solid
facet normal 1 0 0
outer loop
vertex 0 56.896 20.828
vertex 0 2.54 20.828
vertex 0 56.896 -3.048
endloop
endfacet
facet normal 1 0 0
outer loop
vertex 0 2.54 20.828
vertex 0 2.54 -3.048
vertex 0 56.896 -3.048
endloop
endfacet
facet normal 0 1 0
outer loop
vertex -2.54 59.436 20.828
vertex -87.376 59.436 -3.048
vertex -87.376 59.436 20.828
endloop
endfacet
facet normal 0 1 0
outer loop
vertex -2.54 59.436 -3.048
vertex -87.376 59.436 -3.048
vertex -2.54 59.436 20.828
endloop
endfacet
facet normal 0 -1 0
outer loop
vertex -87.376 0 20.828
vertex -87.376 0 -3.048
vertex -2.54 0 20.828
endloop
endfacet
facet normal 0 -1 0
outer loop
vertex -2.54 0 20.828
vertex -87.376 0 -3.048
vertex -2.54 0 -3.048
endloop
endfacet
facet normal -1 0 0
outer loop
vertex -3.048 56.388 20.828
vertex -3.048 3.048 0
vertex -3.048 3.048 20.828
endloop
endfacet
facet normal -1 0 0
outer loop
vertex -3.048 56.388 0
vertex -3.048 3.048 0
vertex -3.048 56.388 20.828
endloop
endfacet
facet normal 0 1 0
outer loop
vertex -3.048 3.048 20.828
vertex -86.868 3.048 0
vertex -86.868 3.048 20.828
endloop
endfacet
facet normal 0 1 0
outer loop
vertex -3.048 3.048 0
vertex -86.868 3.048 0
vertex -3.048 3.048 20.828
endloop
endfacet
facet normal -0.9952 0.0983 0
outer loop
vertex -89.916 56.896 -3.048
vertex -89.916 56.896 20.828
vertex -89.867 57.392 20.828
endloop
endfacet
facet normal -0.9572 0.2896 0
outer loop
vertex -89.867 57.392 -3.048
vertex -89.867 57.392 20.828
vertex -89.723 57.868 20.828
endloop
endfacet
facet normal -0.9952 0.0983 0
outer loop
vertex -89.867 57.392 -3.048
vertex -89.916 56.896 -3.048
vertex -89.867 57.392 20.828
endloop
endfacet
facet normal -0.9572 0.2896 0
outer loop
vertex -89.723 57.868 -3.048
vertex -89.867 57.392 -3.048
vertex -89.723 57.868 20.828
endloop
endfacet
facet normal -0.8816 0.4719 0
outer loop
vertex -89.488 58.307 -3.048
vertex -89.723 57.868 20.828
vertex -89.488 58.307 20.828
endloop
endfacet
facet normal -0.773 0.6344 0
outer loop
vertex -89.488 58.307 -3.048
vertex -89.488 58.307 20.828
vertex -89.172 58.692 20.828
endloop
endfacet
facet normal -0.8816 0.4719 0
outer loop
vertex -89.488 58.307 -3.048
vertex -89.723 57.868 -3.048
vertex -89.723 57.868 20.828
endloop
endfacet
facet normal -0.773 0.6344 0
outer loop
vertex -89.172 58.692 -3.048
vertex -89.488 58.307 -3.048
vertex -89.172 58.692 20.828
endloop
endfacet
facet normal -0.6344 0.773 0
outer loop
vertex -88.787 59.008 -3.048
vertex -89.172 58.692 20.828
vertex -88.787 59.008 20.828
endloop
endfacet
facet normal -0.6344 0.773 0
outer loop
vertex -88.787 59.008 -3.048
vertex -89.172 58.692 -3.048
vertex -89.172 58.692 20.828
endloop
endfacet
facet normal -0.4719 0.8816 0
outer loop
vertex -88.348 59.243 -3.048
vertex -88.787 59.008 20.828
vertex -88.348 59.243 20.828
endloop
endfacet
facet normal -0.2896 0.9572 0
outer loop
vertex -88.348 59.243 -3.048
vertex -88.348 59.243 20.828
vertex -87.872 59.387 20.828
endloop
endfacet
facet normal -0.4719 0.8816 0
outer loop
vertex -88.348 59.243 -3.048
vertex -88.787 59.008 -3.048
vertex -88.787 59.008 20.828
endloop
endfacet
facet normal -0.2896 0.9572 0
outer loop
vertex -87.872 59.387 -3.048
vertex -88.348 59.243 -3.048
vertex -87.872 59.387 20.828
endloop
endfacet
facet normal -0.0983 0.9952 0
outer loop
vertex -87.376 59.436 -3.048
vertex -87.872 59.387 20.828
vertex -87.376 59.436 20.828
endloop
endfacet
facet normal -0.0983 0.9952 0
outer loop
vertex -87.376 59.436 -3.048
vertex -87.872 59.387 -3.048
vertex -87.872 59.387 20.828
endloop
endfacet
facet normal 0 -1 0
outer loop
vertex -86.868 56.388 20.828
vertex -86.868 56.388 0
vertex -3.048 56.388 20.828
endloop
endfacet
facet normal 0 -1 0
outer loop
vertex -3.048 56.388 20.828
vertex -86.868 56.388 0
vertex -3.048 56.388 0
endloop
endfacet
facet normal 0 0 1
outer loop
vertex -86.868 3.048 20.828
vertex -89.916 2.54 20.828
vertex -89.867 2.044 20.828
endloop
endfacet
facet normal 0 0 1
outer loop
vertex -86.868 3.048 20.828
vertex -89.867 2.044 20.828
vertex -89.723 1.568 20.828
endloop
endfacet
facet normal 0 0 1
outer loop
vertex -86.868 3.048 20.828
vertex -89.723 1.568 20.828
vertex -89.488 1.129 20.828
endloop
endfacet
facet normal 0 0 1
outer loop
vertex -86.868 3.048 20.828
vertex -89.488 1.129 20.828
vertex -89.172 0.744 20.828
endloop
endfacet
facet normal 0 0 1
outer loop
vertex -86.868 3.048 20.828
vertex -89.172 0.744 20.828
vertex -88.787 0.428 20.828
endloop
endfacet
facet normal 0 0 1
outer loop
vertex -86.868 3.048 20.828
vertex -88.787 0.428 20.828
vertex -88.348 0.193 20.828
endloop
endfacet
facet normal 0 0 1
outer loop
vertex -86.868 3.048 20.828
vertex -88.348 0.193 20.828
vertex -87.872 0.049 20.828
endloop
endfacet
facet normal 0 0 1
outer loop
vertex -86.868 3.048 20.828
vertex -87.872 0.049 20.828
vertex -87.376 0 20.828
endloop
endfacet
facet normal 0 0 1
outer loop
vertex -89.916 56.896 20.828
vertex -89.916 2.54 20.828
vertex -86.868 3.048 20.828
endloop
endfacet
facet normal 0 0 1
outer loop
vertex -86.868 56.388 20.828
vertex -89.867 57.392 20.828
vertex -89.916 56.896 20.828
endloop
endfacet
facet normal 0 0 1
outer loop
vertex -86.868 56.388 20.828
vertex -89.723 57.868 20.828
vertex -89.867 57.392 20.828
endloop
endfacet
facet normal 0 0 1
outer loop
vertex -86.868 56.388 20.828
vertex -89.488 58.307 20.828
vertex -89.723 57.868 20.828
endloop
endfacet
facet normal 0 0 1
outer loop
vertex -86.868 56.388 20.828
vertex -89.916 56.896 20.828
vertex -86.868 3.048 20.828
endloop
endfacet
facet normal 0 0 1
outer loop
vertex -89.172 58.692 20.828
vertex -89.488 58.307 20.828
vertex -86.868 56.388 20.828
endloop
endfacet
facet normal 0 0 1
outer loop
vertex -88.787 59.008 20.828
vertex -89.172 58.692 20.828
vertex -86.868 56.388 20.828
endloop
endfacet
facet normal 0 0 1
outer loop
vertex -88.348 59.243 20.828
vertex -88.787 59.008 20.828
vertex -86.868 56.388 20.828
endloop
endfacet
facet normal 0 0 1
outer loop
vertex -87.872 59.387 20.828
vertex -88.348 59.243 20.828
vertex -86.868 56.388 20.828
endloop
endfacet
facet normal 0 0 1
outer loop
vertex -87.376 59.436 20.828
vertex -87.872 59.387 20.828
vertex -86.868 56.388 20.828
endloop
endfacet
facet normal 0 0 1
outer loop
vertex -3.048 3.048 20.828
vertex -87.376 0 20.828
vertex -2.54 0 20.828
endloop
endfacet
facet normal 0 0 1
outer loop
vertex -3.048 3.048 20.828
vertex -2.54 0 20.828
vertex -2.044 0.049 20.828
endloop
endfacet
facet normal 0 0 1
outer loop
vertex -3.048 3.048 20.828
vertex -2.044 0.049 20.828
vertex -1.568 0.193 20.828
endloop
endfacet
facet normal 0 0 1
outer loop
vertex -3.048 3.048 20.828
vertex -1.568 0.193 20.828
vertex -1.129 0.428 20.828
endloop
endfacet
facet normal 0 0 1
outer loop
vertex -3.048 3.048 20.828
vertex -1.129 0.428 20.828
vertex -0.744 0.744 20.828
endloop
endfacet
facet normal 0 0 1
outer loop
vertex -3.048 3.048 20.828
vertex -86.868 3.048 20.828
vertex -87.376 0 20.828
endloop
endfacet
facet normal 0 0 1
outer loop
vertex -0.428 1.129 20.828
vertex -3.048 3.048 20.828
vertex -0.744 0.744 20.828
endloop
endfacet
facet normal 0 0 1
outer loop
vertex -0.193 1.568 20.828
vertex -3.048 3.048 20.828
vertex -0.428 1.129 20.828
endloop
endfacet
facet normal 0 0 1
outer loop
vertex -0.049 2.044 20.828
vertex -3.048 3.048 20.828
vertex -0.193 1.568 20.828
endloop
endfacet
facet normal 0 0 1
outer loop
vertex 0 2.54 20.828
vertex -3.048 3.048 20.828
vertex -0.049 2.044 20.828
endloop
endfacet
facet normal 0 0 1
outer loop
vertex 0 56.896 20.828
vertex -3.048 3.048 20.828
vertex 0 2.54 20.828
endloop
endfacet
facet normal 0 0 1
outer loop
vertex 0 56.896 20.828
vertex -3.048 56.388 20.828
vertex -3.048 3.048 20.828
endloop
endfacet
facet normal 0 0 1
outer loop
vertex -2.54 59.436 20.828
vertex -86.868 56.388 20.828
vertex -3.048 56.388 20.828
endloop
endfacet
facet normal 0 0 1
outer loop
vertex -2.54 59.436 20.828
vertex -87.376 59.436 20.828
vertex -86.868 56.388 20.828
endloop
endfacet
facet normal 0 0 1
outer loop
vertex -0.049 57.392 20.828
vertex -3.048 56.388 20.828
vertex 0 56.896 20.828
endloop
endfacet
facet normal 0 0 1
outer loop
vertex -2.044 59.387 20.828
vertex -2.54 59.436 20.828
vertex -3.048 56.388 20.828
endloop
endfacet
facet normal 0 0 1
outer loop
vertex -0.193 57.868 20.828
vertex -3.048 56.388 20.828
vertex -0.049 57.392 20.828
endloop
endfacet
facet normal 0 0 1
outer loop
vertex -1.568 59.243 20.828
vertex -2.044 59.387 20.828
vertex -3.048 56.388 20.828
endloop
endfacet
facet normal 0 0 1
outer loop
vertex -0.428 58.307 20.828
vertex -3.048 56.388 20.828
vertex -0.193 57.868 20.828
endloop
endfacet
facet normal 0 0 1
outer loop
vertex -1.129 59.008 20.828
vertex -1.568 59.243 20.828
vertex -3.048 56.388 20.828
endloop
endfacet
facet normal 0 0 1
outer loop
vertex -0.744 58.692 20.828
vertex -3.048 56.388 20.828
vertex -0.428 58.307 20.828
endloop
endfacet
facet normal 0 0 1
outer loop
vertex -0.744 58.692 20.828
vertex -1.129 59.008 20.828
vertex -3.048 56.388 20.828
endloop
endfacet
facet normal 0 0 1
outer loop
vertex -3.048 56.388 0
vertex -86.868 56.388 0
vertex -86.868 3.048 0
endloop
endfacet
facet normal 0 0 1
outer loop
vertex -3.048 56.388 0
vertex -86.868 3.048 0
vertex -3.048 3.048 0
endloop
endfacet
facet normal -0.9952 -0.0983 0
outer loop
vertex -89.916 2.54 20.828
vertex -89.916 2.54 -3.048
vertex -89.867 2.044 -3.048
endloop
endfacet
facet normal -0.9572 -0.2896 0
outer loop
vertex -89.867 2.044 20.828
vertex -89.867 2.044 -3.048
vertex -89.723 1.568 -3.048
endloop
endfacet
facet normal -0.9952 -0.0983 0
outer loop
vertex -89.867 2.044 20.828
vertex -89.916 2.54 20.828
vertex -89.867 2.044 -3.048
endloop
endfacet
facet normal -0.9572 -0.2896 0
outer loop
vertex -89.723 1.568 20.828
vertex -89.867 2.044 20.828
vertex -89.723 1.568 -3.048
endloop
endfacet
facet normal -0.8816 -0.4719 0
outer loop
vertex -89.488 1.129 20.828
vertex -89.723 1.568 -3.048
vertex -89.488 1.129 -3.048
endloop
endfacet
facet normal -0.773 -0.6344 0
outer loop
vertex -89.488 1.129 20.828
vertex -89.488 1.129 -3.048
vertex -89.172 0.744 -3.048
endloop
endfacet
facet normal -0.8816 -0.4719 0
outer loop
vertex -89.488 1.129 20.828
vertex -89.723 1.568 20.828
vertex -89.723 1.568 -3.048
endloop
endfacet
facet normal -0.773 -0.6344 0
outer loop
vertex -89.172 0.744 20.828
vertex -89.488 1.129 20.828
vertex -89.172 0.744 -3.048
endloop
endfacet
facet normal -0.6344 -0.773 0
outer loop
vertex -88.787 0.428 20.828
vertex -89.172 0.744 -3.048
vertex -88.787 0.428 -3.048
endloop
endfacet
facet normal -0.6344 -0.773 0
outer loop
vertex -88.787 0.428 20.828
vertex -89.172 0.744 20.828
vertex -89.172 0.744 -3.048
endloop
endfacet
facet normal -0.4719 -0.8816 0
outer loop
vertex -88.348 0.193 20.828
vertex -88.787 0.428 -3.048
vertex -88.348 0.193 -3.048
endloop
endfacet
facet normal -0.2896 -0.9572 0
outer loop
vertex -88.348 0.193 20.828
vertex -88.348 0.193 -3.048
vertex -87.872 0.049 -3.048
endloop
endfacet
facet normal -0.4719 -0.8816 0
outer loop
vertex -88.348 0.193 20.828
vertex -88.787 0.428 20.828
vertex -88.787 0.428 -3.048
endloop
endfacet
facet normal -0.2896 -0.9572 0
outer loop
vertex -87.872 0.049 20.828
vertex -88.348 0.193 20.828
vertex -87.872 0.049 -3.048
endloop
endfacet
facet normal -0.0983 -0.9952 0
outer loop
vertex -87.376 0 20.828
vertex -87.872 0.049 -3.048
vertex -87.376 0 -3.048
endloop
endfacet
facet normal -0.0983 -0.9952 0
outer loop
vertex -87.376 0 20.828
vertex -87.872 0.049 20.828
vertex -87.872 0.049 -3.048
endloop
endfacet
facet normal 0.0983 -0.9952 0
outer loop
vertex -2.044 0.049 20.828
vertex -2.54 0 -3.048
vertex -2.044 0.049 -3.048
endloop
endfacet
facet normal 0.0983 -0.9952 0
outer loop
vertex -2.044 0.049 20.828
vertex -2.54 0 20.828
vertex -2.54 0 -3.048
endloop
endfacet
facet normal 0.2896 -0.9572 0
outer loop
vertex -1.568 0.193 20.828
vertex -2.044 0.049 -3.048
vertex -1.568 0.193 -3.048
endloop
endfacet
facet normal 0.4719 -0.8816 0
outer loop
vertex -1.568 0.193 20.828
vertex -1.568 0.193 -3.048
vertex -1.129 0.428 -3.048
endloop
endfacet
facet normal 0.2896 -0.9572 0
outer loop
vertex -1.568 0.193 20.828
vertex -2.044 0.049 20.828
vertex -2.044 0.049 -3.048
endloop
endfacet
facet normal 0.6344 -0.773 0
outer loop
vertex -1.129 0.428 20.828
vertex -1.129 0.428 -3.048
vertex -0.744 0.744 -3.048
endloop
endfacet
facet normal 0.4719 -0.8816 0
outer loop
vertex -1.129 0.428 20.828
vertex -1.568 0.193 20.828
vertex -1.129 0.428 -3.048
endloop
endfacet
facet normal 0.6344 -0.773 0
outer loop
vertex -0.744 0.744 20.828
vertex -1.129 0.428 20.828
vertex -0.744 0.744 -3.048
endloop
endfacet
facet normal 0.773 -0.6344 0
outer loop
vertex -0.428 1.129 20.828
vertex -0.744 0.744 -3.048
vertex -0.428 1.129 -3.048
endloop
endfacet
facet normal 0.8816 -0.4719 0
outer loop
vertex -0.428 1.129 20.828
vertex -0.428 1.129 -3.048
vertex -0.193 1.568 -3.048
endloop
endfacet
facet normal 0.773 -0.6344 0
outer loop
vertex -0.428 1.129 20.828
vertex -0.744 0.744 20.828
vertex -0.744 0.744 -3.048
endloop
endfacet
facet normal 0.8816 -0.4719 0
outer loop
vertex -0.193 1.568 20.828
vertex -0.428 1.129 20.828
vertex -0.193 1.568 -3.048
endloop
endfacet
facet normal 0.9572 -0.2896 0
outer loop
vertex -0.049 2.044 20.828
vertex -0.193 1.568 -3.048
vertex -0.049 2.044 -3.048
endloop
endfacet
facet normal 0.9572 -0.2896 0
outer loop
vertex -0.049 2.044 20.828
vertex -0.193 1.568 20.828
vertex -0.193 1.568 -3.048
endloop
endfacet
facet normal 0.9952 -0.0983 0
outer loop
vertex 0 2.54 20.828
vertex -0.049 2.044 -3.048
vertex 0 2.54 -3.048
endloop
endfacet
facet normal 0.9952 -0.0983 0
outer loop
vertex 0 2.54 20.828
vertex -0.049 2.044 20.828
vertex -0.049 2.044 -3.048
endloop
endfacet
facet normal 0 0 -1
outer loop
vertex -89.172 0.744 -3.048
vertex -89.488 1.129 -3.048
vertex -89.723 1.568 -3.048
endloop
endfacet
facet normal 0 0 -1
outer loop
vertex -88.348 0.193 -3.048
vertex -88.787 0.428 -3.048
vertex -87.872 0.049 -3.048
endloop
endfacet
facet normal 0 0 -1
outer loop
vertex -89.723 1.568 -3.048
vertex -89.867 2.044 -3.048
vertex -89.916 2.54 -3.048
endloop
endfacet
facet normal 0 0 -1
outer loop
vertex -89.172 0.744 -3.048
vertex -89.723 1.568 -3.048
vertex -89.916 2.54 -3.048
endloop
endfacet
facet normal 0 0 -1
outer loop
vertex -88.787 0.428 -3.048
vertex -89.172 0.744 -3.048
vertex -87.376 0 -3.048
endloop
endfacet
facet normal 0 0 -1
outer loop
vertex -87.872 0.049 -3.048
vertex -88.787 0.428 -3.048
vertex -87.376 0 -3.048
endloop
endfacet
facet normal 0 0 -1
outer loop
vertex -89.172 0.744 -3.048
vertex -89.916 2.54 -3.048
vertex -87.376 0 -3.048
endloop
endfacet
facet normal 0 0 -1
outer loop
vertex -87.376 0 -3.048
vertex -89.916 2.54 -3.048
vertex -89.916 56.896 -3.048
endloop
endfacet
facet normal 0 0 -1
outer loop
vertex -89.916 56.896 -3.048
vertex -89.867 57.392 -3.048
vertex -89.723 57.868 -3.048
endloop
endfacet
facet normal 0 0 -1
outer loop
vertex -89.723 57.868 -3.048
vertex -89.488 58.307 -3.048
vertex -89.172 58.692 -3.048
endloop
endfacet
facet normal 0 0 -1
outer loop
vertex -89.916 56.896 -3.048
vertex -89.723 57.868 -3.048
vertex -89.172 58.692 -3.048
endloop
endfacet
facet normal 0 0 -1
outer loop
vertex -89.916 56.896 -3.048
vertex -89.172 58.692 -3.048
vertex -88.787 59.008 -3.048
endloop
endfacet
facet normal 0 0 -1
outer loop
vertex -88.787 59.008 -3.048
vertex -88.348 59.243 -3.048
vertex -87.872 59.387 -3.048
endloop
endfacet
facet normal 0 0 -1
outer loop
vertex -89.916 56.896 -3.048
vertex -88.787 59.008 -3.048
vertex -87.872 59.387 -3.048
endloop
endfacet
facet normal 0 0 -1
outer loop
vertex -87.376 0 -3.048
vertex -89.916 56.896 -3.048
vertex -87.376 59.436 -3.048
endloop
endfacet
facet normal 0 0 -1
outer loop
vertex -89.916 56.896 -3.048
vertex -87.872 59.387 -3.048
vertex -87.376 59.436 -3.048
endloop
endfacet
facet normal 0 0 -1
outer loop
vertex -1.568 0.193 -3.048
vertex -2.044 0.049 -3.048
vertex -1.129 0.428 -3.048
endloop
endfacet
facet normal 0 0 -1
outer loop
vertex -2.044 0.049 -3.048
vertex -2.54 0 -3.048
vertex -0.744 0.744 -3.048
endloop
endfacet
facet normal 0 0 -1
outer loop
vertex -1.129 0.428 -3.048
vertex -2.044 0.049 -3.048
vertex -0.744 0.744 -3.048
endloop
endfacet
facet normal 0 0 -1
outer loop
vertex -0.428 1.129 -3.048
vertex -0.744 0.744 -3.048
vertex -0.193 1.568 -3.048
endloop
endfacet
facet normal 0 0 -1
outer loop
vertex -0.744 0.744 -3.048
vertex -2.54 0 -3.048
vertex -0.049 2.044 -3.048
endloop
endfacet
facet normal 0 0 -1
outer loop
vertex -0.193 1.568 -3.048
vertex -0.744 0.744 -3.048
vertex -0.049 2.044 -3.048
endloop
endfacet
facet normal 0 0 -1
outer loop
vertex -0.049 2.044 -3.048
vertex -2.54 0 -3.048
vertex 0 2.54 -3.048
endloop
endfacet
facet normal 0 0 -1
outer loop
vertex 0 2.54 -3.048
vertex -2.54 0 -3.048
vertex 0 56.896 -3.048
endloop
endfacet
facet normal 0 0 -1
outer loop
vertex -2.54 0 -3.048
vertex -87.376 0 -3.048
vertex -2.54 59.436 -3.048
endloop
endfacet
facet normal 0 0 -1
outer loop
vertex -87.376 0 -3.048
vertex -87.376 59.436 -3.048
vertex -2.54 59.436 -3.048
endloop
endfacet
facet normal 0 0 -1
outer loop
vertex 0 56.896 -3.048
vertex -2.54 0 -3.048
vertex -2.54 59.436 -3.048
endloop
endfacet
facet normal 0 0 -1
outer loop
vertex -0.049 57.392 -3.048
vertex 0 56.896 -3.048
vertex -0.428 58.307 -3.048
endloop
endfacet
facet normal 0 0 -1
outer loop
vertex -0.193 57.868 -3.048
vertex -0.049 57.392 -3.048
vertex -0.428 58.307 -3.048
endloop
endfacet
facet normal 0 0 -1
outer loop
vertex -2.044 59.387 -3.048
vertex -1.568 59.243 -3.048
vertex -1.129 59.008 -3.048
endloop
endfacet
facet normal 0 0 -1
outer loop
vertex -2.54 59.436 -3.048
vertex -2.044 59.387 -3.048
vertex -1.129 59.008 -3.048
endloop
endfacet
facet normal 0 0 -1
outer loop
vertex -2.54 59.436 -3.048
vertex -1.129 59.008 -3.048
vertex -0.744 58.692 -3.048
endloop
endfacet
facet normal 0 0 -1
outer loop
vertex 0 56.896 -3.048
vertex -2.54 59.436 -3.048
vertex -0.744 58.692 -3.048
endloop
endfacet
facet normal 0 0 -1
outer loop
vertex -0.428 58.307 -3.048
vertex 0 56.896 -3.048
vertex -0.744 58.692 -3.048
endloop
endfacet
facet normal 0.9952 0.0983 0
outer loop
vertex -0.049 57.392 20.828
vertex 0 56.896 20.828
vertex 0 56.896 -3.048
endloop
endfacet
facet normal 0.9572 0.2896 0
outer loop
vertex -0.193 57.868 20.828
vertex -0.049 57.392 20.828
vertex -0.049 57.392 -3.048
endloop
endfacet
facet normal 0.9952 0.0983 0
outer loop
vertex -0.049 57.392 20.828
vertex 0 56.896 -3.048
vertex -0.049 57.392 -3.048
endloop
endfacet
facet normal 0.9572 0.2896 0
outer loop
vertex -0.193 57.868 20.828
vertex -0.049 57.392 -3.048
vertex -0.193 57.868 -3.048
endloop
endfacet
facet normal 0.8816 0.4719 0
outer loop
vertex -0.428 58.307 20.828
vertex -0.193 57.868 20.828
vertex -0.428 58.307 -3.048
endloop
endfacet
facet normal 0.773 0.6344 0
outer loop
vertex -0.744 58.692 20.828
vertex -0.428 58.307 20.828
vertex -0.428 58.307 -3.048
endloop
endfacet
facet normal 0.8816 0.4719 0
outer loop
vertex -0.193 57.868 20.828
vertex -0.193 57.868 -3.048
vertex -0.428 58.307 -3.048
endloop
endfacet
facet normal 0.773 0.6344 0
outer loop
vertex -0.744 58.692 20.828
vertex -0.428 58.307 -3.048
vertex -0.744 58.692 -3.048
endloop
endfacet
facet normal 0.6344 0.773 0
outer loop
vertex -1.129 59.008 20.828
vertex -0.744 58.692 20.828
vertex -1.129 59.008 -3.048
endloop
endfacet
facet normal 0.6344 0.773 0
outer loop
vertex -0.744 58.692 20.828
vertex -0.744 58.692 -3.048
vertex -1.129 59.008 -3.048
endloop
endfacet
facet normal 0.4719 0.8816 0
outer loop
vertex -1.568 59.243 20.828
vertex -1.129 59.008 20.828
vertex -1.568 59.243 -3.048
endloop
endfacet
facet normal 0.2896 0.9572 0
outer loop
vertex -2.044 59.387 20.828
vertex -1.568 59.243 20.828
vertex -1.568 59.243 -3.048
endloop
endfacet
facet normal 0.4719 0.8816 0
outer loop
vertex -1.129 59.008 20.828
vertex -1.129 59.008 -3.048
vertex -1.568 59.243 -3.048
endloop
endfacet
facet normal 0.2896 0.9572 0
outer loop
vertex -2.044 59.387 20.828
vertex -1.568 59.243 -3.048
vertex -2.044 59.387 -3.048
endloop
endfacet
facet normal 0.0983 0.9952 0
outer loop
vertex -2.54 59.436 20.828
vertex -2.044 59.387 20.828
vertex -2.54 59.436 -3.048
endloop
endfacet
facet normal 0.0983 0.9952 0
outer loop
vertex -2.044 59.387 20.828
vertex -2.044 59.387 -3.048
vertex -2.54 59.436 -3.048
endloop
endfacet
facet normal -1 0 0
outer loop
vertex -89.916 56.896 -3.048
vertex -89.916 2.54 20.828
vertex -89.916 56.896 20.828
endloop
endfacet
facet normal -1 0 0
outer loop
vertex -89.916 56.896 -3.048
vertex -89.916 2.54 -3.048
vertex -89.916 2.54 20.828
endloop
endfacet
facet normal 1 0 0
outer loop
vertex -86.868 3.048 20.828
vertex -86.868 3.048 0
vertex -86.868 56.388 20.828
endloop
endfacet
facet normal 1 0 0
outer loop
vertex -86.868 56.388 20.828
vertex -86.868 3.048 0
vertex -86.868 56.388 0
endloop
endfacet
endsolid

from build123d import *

# Parameters (mm, degrees)
F0_W     = 89.916
F0_H     = 59.436
F0_W_2   = 83.82
F0_H_2   = 53.34
F1_DEPTH = 3.048
F2_DEPTH = 20.828
F3_R     = 2.54


with BuildPart() as f1:
    # F0 (on Top) → F1 (new body)
    with BuildSketch(Plane.XY):
        with Locations((-44.958, 29.718)):
            Rectangle(F0_W, F0_H)
        with Locations((-44.958, 29.718)):
            Rectangle(F0_W_2, F0_H_2, mode=Mode.SUBTRACT)
        with Locations((-44.958, 29.718)):
            Rectangle(F0_W_2, F0_H_2)
    extrude(amount=-F1_DEPTH)

    # F0 (on Top) → F2 (join)
    with BuildSketch(Plane.XY):
        with Locations((-44.958, 29.718)):
            Rectangle(F0_W, F0_H)
        with Locations((-44.958, 29.718)):
            Rectangle(F0_W_2, F0_H_2, mode=Mode.SUBTRACT)
    extrude(amount=F2_DEPTH)

    # F3
    f3_edges = [f1.edges().sort_by_distance(p)[0] for p in [
        (0, 0, 8.89),
        (0, 59.436, 8.89),
        (-89.916, 59.436, 8.89),
        (-89.916, 0, 8.89),
    ]]
    fillet(f3_edges, radius=F3_R)


solid = f1.part
